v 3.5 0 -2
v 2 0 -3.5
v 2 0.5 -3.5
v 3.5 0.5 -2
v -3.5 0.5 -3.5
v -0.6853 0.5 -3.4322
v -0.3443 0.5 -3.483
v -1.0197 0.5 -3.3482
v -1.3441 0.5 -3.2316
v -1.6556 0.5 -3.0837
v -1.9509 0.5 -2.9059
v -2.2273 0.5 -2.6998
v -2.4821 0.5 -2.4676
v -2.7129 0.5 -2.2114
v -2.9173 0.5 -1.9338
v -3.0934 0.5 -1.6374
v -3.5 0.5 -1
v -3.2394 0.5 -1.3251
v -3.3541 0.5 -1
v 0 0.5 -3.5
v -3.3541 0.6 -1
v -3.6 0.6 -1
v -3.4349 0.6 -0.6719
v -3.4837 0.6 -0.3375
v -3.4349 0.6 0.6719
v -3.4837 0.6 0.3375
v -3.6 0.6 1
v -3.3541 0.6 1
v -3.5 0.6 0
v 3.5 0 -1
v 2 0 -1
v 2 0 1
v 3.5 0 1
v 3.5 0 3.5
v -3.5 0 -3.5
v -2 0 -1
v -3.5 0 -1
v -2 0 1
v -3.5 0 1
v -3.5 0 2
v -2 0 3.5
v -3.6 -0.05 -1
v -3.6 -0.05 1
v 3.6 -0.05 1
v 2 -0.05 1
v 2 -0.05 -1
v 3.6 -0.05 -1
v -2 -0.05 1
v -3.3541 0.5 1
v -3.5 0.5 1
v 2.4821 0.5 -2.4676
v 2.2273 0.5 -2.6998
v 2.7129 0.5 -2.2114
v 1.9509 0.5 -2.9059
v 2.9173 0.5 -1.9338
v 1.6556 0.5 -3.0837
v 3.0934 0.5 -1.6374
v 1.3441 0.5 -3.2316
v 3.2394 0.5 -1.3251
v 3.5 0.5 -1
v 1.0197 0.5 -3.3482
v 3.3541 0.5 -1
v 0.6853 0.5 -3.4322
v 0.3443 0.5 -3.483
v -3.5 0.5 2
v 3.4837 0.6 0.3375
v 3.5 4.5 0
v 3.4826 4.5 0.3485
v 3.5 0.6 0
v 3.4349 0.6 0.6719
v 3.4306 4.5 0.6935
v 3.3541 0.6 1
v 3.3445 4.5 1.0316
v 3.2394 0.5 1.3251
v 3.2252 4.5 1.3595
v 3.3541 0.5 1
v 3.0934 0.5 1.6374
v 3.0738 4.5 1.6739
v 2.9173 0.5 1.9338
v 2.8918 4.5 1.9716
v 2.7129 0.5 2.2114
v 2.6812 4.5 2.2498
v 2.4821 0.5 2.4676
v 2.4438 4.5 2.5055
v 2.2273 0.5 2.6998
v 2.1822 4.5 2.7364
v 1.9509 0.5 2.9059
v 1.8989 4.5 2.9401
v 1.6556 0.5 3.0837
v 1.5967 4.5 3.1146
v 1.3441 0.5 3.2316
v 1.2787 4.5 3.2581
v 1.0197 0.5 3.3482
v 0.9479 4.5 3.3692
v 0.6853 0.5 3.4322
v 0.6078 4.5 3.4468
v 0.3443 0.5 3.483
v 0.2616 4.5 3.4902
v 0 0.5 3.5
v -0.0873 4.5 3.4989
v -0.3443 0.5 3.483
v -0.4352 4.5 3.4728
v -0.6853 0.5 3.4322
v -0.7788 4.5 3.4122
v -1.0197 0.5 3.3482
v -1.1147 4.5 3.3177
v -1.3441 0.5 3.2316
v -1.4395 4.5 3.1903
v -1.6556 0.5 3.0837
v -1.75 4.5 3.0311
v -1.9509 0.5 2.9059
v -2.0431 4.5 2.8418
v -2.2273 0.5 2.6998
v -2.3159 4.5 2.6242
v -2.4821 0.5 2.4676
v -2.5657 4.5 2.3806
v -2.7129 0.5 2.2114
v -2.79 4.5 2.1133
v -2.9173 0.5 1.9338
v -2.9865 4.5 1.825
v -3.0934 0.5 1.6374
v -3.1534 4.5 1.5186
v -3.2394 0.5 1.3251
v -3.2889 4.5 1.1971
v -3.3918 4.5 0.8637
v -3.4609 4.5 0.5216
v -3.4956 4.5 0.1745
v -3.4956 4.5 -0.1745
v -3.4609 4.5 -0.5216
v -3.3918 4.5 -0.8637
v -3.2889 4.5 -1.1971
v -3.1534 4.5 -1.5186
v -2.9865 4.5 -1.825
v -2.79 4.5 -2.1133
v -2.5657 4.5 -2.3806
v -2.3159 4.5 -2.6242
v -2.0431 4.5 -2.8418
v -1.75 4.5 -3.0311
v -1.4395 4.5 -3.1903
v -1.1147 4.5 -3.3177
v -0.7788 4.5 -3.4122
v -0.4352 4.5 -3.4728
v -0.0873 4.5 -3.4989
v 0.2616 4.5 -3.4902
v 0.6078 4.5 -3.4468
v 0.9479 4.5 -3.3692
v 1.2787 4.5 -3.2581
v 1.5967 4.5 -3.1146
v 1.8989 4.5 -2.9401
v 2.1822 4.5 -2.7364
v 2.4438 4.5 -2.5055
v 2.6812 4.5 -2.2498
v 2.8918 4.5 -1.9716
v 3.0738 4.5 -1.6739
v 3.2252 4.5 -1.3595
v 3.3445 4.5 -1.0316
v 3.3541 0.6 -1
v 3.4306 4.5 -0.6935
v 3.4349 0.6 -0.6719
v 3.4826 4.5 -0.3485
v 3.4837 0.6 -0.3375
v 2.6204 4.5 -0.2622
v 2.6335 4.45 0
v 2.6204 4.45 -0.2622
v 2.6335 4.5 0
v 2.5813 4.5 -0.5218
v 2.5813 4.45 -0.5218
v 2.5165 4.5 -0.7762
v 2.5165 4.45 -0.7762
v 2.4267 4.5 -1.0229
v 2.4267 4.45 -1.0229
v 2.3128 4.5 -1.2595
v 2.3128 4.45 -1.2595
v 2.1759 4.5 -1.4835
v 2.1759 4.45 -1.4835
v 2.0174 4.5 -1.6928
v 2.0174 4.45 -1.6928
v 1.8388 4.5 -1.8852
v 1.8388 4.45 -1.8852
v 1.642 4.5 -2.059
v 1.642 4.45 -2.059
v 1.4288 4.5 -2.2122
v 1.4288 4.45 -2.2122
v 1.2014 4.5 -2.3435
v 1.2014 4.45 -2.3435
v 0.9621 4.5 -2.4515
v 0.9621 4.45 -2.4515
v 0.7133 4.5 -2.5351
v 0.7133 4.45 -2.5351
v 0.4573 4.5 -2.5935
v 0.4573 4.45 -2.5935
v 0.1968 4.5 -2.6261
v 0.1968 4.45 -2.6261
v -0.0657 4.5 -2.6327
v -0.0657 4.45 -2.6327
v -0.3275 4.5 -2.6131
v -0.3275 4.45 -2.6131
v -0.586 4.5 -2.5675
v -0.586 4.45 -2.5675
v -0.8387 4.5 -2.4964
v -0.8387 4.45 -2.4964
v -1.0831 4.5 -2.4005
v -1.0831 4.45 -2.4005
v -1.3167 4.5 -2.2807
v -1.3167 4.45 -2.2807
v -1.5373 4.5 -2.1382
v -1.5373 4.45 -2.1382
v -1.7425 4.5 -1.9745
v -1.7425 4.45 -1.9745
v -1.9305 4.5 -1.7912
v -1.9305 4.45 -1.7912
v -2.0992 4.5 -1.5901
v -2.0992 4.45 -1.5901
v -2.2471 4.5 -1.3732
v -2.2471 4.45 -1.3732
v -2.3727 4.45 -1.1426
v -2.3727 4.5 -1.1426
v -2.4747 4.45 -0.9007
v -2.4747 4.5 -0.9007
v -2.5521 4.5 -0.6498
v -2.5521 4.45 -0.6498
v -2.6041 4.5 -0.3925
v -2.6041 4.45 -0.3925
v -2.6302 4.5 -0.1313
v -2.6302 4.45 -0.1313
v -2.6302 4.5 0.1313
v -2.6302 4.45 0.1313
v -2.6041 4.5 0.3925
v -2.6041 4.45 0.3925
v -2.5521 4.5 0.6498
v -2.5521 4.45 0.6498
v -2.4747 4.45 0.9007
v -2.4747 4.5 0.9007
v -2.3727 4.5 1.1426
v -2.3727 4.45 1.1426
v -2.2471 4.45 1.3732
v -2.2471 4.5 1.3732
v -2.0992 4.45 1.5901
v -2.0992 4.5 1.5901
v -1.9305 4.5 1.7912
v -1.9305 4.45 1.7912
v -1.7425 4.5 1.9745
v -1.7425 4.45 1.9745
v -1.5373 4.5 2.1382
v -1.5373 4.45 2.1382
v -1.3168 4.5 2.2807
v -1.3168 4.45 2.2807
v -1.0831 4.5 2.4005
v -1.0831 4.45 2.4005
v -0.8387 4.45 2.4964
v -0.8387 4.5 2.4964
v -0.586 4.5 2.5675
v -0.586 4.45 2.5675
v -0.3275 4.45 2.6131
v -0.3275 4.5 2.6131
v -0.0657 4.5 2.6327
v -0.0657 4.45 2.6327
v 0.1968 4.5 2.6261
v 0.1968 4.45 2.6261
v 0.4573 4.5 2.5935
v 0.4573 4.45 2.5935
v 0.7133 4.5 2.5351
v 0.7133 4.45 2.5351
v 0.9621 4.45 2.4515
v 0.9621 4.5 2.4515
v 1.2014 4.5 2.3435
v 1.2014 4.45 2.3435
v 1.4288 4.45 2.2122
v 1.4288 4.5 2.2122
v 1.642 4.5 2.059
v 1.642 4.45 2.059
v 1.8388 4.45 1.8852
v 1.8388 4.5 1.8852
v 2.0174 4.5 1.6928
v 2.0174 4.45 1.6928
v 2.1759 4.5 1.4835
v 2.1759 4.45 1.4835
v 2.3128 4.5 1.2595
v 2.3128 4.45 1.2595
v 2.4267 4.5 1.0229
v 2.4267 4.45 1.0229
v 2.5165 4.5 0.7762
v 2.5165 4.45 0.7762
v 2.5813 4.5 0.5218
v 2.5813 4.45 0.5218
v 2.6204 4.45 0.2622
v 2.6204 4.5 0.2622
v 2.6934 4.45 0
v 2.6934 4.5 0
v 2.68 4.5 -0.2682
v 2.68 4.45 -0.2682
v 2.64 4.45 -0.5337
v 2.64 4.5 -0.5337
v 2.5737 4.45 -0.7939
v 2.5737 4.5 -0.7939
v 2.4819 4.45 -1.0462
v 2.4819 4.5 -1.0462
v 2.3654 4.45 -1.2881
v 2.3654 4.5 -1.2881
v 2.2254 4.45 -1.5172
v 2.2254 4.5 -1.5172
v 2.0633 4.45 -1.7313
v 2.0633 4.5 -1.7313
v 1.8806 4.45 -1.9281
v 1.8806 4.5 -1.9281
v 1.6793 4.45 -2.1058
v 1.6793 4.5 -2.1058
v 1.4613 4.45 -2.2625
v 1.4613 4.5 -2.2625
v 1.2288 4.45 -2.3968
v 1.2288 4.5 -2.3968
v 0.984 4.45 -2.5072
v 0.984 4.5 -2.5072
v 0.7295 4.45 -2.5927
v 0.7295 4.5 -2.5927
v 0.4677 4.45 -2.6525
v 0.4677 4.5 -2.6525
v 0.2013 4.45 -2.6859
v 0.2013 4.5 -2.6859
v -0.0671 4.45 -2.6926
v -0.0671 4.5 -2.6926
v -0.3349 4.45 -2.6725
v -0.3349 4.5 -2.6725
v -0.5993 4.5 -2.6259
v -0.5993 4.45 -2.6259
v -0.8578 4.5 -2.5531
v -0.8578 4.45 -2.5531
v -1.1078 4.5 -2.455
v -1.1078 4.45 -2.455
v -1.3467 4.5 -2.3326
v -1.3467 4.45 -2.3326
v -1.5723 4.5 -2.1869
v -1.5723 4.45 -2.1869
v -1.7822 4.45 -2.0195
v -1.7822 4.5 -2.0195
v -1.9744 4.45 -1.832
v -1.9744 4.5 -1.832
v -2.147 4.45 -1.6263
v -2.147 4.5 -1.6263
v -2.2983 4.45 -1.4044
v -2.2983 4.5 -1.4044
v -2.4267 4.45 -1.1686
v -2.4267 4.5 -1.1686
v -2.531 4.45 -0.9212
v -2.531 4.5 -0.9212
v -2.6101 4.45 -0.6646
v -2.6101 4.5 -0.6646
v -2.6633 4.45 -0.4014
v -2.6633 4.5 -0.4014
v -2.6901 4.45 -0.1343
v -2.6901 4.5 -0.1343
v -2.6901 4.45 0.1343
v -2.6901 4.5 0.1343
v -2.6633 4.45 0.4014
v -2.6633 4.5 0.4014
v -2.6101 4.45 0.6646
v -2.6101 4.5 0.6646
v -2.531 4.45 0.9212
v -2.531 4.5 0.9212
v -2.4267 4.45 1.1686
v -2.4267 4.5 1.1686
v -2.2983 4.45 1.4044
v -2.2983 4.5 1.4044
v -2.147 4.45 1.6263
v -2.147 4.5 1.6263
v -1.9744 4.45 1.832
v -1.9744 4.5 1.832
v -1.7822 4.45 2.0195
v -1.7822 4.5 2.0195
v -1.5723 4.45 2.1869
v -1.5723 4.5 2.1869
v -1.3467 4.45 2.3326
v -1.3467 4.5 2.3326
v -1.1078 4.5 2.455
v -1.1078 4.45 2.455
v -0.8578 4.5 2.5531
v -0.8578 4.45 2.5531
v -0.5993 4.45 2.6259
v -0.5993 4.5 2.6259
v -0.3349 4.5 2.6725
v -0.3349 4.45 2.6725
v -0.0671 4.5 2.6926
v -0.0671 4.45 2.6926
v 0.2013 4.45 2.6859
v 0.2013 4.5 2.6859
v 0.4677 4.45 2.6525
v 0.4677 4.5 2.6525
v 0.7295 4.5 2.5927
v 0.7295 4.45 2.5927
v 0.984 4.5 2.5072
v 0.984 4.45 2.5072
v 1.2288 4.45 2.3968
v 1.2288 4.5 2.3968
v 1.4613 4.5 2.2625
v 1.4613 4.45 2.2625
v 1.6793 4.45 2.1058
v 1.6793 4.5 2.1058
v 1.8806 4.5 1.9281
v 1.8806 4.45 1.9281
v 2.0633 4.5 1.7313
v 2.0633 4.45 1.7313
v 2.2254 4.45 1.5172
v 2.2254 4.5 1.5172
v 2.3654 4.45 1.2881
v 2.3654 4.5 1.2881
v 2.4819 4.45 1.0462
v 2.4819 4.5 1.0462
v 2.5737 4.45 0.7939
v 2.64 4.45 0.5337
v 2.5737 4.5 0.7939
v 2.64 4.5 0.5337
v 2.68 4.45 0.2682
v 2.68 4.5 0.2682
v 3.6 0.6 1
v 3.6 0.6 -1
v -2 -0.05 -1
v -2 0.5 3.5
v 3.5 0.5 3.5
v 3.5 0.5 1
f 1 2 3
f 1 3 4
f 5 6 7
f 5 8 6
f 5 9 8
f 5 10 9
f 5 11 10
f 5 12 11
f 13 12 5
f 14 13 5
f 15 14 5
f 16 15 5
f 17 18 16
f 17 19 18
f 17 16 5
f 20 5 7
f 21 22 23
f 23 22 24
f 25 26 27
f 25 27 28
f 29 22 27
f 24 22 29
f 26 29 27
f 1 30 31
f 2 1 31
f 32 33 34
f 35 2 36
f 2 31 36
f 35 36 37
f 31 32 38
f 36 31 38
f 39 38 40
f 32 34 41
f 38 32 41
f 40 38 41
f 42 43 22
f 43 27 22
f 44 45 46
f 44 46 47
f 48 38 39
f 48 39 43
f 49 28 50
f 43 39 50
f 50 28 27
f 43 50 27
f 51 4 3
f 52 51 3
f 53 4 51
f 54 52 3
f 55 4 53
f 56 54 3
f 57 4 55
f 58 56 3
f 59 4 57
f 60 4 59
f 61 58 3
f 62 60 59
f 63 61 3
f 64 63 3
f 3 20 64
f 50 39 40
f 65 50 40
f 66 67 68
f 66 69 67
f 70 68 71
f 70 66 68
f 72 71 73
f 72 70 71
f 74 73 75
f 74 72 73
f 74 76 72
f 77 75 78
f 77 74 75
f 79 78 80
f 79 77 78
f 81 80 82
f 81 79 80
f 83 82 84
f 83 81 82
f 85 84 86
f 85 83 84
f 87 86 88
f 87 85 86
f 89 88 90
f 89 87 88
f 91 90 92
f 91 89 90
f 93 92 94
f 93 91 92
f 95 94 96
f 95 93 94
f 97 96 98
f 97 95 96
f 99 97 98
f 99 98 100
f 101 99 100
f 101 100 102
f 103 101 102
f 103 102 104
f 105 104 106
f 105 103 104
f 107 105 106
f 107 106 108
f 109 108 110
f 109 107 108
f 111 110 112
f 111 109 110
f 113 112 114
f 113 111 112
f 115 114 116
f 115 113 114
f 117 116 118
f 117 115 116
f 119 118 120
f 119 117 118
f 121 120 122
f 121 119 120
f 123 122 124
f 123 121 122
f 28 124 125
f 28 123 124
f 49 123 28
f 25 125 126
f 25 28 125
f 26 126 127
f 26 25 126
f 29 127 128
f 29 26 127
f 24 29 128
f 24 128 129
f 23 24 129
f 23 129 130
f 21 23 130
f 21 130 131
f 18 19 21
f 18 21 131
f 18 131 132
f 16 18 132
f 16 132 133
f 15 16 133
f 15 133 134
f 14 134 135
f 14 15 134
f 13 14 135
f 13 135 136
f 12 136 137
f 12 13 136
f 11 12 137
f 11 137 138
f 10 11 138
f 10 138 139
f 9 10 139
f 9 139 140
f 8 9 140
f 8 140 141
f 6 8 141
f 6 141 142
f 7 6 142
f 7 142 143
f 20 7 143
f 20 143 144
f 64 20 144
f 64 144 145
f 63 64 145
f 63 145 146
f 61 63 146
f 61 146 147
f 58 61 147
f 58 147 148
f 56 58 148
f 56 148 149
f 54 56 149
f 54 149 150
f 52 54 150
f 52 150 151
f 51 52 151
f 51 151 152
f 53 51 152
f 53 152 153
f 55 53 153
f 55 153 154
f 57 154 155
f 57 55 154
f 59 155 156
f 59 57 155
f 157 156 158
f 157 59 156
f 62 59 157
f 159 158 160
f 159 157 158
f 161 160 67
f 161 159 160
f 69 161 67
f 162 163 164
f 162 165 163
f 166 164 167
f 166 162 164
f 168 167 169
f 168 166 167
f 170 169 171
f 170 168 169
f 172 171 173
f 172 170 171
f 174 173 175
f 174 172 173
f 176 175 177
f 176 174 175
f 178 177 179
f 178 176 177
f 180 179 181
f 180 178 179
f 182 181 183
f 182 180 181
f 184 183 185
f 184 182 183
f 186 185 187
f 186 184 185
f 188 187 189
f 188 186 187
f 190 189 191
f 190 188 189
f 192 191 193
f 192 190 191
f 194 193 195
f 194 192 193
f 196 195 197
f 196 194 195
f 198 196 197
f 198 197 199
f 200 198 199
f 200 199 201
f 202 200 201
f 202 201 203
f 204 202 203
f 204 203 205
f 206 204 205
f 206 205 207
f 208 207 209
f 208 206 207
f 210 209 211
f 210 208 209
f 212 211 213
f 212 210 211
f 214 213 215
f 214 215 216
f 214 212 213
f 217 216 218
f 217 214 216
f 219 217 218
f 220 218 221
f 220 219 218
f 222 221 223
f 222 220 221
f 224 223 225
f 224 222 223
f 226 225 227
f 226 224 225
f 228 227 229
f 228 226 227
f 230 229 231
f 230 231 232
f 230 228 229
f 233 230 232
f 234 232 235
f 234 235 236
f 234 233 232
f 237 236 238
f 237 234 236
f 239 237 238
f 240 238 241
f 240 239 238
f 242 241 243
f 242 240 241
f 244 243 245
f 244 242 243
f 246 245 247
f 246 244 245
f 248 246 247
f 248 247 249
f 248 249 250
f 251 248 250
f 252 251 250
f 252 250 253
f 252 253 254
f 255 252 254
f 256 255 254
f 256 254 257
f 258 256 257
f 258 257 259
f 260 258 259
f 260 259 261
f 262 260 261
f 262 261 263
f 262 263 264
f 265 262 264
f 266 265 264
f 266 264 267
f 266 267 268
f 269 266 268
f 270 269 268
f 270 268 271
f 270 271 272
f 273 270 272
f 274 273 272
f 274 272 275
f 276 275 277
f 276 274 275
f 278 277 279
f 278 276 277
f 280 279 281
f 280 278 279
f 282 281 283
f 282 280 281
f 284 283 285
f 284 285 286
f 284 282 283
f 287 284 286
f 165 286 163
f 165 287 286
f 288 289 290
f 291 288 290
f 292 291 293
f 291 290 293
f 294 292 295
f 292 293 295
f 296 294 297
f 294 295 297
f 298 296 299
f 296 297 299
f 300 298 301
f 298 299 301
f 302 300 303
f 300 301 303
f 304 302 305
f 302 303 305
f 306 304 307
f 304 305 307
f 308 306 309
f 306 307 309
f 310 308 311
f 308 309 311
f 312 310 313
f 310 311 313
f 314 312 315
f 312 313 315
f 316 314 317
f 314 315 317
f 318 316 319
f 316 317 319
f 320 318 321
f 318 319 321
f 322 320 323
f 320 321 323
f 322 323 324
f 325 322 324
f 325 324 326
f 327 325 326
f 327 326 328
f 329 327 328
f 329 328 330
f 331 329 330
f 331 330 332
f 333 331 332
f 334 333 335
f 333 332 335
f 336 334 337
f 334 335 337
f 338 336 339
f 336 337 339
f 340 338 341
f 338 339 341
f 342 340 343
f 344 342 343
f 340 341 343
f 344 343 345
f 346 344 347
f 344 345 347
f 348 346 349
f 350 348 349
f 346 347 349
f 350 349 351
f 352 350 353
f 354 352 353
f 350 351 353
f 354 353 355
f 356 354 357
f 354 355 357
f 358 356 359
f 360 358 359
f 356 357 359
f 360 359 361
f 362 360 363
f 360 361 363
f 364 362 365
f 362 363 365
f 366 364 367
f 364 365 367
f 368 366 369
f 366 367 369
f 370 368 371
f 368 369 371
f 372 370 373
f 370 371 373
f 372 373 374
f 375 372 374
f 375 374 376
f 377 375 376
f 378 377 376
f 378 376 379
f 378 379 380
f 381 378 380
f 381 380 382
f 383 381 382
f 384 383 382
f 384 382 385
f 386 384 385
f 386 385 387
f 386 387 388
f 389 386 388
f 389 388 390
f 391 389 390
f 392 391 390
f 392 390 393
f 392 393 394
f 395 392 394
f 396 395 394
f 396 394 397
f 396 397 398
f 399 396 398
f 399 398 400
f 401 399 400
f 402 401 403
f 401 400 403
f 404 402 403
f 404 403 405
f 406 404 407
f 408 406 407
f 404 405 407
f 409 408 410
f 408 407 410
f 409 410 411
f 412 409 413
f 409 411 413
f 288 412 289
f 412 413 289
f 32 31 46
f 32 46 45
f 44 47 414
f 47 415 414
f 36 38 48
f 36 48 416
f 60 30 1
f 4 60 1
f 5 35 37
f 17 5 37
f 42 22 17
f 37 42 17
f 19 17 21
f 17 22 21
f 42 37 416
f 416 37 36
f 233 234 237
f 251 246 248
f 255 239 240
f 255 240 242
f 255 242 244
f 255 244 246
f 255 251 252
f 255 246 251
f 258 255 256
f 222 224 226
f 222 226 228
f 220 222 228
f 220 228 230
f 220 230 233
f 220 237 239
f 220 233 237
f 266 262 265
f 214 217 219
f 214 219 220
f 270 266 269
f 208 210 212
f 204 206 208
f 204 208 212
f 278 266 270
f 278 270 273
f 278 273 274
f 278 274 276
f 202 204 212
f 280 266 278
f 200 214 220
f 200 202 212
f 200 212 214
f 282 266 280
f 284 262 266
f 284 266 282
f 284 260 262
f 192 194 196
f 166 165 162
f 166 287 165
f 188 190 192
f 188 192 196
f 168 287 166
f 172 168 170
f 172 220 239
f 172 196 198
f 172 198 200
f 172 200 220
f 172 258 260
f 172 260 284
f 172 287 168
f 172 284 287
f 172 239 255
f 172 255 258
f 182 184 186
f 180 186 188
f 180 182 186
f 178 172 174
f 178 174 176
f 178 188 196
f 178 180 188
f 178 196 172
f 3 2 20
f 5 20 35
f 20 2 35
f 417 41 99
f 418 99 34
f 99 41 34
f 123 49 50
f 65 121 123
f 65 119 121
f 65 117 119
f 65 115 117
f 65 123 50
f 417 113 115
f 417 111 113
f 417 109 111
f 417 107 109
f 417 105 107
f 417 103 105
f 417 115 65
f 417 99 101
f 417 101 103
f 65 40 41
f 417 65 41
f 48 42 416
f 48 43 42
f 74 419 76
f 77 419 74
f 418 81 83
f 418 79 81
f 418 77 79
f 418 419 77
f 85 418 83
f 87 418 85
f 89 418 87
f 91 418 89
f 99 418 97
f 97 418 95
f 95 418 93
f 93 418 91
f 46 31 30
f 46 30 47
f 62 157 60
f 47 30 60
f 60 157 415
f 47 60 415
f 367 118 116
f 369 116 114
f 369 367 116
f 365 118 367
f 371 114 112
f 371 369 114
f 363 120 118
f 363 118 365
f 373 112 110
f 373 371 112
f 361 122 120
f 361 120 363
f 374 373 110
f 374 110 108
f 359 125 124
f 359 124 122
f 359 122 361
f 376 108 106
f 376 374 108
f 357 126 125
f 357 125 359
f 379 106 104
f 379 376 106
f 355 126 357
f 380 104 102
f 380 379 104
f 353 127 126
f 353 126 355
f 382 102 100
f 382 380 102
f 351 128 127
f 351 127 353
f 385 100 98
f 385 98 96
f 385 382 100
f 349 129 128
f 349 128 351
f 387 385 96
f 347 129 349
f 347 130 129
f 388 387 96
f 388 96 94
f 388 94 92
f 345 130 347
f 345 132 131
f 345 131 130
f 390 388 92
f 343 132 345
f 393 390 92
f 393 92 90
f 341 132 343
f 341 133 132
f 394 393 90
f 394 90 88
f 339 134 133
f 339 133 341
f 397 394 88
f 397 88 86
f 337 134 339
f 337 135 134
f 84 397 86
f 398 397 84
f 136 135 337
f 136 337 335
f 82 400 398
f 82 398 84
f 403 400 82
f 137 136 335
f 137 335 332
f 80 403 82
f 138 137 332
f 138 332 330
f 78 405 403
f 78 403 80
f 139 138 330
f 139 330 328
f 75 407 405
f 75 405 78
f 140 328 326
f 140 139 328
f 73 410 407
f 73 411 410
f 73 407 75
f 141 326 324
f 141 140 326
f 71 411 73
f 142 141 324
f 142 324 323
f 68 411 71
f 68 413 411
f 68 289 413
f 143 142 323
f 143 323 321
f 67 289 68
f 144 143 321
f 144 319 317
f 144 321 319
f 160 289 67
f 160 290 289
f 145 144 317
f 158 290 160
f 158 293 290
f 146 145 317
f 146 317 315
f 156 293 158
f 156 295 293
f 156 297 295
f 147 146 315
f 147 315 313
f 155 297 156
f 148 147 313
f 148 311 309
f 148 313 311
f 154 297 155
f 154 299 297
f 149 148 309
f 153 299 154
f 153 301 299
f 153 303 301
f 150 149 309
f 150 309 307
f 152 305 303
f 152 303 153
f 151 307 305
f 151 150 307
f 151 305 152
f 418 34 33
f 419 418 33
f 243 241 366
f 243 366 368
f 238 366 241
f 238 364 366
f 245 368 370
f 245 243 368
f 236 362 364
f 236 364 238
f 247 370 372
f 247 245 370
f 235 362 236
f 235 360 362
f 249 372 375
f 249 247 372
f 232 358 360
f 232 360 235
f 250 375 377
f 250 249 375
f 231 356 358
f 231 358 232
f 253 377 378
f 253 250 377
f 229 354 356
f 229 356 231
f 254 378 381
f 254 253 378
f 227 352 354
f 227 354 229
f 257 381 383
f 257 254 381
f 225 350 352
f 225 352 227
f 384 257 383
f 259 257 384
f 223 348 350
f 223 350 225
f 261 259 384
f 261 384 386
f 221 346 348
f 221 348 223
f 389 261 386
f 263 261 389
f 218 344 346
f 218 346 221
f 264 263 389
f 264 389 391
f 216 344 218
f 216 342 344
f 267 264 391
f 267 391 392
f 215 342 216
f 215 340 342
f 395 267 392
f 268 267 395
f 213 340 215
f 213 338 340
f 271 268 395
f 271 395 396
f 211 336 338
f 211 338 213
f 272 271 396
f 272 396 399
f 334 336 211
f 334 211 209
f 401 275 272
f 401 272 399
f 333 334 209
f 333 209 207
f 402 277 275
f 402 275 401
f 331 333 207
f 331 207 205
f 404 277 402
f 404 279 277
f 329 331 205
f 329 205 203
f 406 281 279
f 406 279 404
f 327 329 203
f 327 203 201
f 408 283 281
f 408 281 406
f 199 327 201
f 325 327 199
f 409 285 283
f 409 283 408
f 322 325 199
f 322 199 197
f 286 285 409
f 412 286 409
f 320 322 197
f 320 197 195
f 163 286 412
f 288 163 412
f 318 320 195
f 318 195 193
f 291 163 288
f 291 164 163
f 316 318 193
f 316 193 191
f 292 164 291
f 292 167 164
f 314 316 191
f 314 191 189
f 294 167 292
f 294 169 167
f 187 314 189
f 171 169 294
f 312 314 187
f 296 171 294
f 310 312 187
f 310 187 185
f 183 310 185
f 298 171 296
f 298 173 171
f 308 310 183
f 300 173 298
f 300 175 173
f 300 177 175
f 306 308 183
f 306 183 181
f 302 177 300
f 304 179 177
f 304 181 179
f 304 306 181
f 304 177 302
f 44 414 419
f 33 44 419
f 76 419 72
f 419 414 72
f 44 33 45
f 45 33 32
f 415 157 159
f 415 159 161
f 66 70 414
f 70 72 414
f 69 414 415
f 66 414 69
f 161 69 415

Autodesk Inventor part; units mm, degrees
ref_plane "YZ Plane" through (0, 0, 0) normal (1, 0, 0) x (0, 1, 0)
ref_plane "XZ Plane" through (0, 0, 0) normal (0, 1, 0) x (-1, 0, 0)
ref_plane "XY Plane" through (0, 0, 0) normal (0, 0, 1) x (1, 0, 0)
sketch "Sketch1" plane through (0, 0, 0) normal (0, 1, 0) x (-1, 0, 0)
  line L0 (3.5, 3.5) -> (-3.5, 3.5)
  line L1 (-3.5, 3.5) -> (-3.5, -3.5)
  line L2 (-3.5, -3.5) -> (3.5, -3.5)
  line L3 (3.5, -3.5) -> (3.5, 3.5)
  line L4 (3.5, 2) -> (2, 3.5)
  line L5 (-2, -3.5) -> (-3.5, -2)
  point P0 (0, 0)
  dimension "d0" = 7
  dimension "d1" = 7
  dimension "d2" = 3.5
  dimension "d3" = 3.5
  dimension "d4" = 45
  dimension "d5" = 45
  dimension "d6" = 5.5
  dimension "d7" = 5.5
extrude "Extrusion1" add sketch "Sketch1" along normal blind 0.5 contours L4 L3 L2 L5 L1 L0
sketch "Sketch2" plane through (0, 0.5, 0) normal (0, 1, 0) x (1, 0, 0)
  circle A0 centre (0, 0) radius 3.5
  dimension "d10" = 7
extrude "Extrusion2" add sketch "Sketch2" along normal blind 4
sketch "Sketch3" plane through (0, 4.5, 0) normal (0, 1, 0) x (1, 0, 0)
  circle A0 centre (0, 0) radius 2.6934
  circle A1 centre (0, 0) radius 2.6335
extrude "Extrusion3" cut sketch "Sketch3" against normal blind 0.05
sketch "Sketch4" plane through (0, 0, 0) normal (0, -1, 0) x (1, 0, 0)
  line L0 (3.5, 3.5) -> (3.5, 0) projected
  line L1 (3.5, 1) -> (2, 1)
  line L2 (2, 1) -> (2, -1)
  line L3 (2, -1) -> (3.5, -1)
  line L4 (3.5, -1) -> (3.5, 1)
  line L5 (-2, 3.5) -> (3.5, 3.5) projected
  point P0 (0, 0)
  dimension "d15" = 1.5
  dimension "d16" = 2
  dimension "d17" = 2.5
extrude "Extrusion4" cut sketch "Sketch4" against normal blind 0.6
sketch "Sketch5" plane through (0, 0.6, 0) normal (0, -1, 0) x (1, 0, 0)
  line L0 (2, -1) -> (2, 1) projected
  line L1 (3.6, 1) -> (2, 1)
  line L2 (2, 1) -> (2, -1)
  line L3 (2, -1) -> (3.6, -1)
  line L4 (3.6, -1) -> (3.6, 1)
  point P0 (0, 0)
  dimension "d20" = 2
  dimension "d21" = 1.6
extrude "Extrusion5" add sketch "Sketch5" along normal blind 0.65
mirror "Mirror1" about plane through (0, 0, 0) normal (1, 0, 0) of "Extrusion4"
mirror "Mirror2" about plane through (0, 0, 0) normal (1, 0, 0) of "Extrusion5"
properties part number "SRR7045-151M"
